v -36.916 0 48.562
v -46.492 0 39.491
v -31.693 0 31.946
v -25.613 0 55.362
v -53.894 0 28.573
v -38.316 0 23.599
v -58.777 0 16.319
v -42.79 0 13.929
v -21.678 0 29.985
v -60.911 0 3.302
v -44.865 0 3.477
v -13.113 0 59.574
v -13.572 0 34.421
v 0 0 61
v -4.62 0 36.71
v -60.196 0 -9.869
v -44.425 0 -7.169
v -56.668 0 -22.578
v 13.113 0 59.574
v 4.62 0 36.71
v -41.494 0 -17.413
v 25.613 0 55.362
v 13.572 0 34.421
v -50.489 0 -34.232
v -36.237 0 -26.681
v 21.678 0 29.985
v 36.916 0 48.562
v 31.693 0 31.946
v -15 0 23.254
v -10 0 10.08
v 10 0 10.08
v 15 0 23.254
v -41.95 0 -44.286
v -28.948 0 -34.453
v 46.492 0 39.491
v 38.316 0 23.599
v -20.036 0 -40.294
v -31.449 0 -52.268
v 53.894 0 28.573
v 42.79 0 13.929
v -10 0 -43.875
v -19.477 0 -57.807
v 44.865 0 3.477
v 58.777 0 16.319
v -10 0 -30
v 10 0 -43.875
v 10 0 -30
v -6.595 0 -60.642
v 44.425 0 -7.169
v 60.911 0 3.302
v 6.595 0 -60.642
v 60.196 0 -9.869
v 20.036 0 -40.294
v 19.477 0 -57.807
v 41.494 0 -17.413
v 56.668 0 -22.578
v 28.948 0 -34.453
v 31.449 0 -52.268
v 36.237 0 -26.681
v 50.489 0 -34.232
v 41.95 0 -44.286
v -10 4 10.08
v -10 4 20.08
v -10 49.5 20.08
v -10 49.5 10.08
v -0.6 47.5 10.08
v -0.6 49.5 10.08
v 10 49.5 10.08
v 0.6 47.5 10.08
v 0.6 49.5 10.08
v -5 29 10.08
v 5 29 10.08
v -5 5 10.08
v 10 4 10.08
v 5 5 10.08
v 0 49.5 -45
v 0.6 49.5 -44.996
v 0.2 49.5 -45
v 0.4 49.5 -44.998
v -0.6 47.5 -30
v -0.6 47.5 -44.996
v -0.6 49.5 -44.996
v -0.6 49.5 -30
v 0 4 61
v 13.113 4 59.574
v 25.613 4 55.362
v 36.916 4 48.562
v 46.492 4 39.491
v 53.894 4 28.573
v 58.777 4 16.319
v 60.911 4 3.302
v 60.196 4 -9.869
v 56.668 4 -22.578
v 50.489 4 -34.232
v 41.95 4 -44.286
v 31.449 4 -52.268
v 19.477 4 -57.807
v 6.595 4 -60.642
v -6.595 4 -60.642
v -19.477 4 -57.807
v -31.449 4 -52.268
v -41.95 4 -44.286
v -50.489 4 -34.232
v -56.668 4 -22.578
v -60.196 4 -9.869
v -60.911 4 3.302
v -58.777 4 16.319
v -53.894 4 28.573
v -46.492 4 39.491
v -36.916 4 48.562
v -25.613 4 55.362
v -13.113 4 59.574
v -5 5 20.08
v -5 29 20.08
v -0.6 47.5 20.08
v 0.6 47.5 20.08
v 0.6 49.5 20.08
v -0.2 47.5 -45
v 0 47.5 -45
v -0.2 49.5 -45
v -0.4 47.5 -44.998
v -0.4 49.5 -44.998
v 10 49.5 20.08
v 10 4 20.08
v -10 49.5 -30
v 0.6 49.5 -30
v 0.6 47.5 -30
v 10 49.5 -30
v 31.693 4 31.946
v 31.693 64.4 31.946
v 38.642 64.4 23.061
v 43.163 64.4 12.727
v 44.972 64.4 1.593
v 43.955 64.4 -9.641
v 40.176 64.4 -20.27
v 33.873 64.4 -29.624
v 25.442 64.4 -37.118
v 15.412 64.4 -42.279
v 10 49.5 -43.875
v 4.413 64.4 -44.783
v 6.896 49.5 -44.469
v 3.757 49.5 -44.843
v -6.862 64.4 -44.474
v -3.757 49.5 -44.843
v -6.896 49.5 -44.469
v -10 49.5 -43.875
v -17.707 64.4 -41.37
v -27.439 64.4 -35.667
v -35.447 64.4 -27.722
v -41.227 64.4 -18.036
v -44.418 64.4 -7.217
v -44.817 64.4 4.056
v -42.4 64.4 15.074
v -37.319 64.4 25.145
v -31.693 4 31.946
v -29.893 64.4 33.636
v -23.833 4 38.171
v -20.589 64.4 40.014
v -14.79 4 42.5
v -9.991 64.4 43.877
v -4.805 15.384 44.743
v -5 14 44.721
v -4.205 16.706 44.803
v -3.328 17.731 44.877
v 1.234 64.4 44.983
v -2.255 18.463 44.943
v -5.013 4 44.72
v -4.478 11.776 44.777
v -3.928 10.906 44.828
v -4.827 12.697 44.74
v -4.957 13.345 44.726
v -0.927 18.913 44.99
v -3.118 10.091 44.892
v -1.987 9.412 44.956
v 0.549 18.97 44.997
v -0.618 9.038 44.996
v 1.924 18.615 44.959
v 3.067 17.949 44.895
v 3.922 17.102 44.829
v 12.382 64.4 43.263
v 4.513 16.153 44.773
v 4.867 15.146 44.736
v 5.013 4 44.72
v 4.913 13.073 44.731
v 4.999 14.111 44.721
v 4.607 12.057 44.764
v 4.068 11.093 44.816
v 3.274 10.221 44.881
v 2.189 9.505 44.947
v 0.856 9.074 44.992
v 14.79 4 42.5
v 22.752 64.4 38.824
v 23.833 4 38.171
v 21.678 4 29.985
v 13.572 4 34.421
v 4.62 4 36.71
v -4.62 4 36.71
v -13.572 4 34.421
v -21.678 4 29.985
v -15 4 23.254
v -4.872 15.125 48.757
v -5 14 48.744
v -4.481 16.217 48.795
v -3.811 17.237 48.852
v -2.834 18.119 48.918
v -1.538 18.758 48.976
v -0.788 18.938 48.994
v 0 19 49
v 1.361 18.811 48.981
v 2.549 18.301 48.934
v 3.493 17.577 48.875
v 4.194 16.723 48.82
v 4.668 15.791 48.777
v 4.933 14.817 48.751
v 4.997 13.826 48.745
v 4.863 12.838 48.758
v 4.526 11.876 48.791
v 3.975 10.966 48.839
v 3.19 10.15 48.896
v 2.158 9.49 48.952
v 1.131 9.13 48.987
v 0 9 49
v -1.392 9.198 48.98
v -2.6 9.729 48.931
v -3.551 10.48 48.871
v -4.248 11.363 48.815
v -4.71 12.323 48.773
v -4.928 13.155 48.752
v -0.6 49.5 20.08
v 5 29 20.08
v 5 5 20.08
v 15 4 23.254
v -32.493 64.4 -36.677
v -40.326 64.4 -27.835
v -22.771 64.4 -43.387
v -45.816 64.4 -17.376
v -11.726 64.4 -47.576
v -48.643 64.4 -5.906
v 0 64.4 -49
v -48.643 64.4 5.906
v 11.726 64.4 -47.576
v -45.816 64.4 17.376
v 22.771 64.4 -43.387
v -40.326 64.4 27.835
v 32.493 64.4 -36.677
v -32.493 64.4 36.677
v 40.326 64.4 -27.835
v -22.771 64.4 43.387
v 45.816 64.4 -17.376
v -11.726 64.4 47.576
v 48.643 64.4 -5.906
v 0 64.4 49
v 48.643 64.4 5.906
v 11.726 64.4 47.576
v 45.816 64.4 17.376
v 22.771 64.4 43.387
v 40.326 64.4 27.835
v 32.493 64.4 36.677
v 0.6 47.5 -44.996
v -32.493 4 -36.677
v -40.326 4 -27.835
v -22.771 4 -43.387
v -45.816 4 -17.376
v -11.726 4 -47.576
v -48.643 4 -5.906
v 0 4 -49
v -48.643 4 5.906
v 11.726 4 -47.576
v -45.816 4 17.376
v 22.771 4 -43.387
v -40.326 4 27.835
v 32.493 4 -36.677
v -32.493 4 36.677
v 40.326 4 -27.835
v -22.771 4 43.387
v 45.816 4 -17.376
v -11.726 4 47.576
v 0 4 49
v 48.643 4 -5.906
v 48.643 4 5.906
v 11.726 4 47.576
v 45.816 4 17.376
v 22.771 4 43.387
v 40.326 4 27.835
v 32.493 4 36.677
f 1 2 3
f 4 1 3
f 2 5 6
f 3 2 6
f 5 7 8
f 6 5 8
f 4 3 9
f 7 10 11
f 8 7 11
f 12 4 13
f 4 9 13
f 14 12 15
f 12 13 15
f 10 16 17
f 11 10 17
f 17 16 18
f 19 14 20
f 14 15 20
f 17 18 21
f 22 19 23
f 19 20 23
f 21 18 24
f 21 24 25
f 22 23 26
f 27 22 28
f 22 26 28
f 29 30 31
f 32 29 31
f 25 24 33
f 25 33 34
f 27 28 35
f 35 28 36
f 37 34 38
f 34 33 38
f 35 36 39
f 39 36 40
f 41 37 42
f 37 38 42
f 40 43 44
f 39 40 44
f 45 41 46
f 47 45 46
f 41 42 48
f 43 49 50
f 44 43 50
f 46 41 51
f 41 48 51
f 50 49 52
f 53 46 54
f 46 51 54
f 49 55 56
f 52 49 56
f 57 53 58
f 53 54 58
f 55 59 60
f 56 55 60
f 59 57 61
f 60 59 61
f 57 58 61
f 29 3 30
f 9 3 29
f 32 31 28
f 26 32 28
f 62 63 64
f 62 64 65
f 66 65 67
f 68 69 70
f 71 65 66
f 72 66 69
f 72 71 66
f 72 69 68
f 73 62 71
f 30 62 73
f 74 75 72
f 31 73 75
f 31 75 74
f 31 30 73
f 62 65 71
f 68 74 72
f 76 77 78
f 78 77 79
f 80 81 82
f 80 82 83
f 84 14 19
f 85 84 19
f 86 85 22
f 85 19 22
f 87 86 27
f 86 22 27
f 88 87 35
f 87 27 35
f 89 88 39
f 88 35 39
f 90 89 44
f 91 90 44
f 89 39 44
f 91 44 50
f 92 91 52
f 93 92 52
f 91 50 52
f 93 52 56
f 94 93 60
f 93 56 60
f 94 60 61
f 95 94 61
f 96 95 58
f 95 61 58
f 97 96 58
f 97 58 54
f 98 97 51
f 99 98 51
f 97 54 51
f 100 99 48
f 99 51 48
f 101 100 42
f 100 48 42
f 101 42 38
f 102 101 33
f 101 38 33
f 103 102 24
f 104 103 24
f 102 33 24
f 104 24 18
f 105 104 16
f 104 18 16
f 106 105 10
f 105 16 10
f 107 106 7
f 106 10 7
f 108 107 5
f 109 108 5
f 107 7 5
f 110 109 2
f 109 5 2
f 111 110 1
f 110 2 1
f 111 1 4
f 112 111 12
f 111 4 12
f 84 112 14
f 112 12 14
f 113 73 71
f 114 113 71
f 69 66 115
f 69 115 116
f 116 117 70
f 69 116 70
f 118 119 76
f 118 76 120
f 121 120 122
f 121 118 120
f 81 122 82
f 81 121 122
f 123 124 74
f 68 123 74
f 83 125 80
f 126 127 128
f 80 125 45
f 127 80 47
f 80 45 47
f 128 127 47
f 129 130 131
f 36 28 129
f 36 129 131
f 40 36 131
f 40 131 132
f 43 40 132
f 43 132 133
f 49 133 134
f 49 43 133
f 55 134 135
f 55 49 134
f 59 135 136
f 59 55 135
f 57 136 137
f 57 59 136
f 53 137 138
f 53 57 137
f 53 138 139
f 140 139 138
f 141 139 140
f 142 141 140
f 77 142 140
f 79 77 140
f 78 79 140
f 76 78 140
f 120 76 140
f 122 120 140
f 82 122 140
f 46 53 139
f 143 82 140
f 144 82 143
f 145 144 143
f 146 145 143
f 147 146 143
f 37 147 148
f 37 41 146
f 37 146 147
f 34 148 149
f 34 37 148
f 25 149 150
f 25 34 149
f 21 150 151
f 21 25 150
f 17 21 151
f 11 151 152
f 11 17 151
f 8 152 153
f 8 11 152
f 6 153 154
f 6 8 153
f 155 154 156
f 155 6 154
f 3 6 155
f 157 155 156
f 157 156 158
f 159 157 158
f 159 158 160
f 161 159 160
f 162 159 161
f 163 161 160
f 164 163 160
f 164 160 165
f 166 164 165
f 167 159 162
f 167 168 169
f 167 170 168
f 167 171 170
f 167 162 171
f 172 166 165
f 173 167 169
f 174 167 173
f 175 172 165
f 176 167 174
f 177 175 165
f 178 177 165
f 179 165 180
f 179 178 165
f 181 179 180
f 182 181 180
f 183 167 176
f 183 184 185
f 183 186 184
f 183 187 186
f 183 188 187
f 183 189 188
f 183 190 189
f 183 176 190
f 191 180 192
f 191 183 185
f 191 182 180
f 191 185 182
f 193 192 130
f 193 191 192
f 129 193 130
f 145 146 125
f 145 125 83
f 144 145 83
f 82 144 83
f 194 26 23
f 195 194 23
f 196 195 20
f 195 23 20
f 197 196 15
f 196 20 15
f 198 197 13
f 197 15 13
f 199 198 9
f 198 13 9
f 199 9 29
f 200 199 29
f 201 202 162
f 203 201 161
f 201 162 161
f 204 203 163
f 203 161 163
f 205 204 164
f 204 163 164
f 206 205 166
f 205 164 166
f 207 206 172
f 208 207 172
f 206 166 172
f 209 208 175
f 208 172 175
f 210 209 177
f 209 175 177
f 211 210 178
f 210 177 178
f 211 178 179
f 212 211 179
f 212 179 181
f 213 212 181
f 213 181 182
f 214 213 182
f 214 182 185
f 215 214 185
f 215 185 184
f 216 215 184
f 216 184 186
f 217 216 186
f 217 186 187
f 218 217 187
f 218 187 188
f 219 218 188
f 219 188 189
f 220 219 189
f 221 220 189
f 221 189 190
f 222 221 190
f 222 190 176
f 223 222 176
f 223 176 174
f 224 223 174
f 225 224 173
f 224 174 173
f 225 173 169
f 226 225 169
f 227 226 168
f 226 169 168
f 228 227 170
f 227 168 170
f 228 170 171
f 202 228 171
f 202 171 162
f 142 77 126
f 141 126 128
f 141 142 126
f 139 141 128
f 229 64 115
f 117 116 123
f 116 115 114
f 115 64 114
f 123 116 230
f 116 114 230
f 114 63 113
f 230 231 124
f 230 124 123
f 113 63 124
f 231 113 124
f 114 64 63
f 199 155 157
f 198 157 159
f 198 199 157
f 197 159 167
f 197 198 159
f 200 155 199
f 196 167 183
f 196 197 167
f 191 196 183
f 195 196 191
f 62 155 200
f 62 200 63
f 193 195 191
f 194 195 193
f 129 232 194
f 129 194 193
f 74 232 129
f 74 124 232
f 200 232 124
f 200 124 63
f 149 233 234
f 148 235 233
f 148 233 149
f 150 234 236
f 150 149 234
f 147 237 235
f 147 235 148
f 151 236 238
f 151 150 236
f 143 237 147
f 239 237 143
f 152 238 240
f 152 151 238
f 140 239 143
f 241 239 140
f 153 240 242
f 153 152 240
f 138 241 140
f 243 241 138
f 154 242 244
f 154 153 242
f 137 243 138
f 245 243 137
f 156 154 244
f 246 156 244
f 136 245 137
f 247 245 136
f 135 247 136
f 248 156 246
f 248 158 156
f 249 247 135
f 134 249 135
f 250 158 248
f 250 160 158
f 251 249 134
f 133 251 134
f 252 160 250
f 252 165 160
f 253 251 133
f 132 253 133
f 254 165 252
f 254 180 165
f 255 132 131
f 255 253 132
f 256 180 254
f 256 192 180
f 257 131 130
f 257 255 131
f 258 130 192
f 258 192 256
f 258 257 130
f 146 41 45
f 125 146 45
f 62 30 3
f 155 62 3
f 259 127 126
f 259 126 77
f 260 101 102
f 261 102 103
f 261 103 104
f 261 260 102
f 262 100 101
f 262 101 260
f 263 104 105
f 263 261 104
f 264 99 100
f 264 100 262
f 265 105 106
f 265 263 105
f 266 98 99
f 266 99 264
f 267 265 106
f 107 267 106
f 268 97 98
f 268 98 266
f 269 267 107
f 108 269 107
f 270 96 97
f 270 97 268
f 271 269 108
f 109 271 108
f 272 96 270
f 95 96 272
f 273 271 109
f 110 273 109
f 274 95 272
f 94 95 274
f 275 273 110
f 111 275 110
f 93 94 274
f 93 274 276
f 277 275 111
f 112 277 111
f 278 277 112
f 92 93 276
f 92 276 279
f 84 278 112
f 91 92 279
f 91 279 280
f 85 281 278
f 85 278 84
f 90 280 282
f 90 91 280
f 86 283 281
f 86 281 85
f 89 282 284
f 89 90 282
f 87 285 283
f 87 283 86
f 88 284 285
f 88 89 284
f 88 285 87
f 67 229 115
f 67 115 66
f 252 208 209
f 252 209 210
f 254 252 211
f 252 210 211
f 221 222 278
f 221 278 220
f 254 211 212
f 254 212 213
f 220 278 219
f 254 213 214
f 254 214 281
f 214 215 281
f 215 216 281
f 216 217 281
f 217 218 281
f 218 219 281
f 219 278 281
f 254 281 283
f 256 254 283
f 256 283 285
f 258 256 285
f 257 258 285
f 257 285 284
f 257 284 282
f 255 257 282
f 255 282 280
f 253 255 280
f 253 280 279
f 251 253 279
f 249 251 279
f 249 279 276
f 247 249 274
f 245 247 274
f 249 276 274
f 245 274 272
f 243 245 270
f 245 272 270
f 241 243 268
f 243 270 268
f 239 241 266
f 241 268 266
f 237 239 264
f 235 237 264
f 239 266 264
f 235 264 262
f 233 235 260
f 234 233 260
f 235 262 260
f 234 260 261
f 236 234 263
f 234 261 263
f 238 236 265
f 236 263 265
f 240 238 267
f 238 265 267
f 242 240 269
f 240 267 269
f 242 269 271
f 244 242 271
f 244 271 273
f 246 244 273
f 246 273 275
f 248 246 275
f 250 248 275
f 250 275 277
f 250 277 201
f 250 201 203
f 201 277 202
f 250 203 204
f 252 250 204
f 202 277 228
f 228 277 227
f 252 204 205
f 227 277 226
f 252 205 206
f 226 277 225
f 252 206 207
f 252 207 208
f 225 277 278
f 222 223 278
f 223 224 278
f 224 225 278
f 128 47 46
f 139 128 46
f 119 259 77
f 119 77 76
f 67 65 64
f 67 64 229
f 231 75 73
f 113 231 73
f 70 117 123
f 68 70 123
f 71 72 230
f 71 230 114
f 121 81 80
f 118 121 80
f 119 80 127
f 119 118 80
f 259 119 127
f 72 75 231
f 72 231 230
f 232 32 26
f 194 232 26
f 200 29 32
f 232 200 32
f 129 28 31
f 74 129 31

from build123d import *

# Parameters (mm, degrees)
SKETCH1_R               = 61
SKETCH1_R_2             = 49
BOSS_EXTRUDE1_DEPTH     = 4
BOSS_EXTRUDE2_DEPTH     = 4
SKETCH1_5_R             = 49
SKETCH1_5_R_2           = 45
BOSS_EXTRUDE3_DEPTH     = 64.4
SKETCH1_8_W             = 20
SKETCH1_8_H             = 10
BOSS_EXTRUDE4_DEPTH     = 49.5
CUT_EXTRUDE1_REACH      = 115.669
SKETCH2_W               = 10
SKETCH2_H               = 24
CUT_EXTRUDE2_REACH      = 115.669
CUT_EXTRUDE2_END_RADIUS = 49
SKETCH3_R               = 5
CUT_EXTRUDE4_START      = -2
CUT_EXTRUDE4_DEPTH      = 2
SKETCH5_W               = 1.2
SKETCH5_H               = 10
CUT_EXTRUDE5_DEPTH      = 2


with BuildPart() as part:
    # Sketch1 → Boss-Extrude1 (new body)
    with BuildSketch(Plane(origin=(0, 0, 0), x_dir=(1, 0, 0), z_dir=(0, 1, 0))):
        with Locations(Location((0, 0, 0), (0, 0, 270))):
            Circle(SKETCH1_R)
        with Locations(Location((0, 0, 0), (0, 0, 270))):
            Circle(SKETCH1_R_2, mode=Mode.SUBTRACT)
    extrude(amount=BOSS_EXTRUDE1_DEPTH)



with BuildPart() as body_2:
    # Sketch1<4> → Boss-Extrude2 (new body)
    with BuildSketch(Plane(origin=(0, 0, 0), x_dir=(1, 0, 0), z_dir=(0, 1, 0))):
        with BuildLine():
            Line((31.692781496, -31.946323748), (10, -10.08))
            Line((10, -10.08), (10, -20.08))
            Line((10, -20.08), (-10, -20.08))
            Line((-10, -20.08), (-10, -10.08))
            Line((-10, -10.08), (-31.692781496, -31.946323748))
            ThreePointArc((-31.692781496, -31.946323748), (0, -45), (31.692781496, -31.946323748))
        make_face()
        with BuildLine():
            Line((-21.677506364, -29.984758092), (-15, -23.253831677))
            Line((-15, -23.253831677), (15, -23.253831677))
            Line((15, -23.253831677), (21.677506364, -29.984758092))
            ThreePointArc((21.677506364, -29.984758092), (0, -37), (-21.677506364, -29.984758092))
        make_face(mode=Mode.SUBTRACT)
    extrude(amount=BOSS_EXTRUDE2_DEPTH)


with BuildPart() as part_1:
    add(part.part)

    add(body_2.part)  # Boss-Extrude3 merges body 2
    # Sketch1<5> → Boss-Extrude3 (add)
    with BuildSketch(Plane(origin=(0, 0, 0), x_dir=(1, 0, 0), z_dir=(0, 1, 0))):
        with Locations(Location((0, 0, 0), (0, 0, 270))):
            Circle(SKETCH1_5_R)
        with Locations(Location((0, 0, 0), (0, 0, 314.77173117))):
            Circle(SKETCH1_5_R_2, mode=Mode.SUBTRACT)
    extrude(amount=BOSS_EXTRUDE3_DEPTH)

    # Sketch1<8> → Boss-Extrude4 (add)
    with BuildSketch(Plane(origin=(0, 0, 0), x_dir=(1, 0, 0), z_dir=(0, 1, 0))):
        with BuildLine():
            Line((-10, 30), (0, 30))
            Line((0, 30), (10, 30))
            Line((10, 30), (10, 43.874821937))
            ThreePointArc((10, 43.874821937), (0, 45), (-10, 43.874821937))
            Line((-10, 43.874821937), (-10, 30))
        make_face()
        with Locations((0, -15.08)):
            Rectangle(SKETCH1_8_W, SKETCH1_8_H)
    extrude(amount=BOSS_EXTRUDE4_DEPTH)

    # Sketch2 → Cut-Extrude1 (cut, up to next)
    with BuildSketch(Plane(origin=(0, 0, 10.08), x_dir=(-1, 0, 0), z_dir=(0, 0, -1)), mode=Mode.PRIVATE) as cut_extrude1_sk1:
        with Locations((0, 17)):
            Rectangle(SKETCH2_W, SKETCH2_H)
    cut_extrude1_tool1 = extrude(cut_extrude1_sk1.sketch, amount=-CUT_EXTRUDE1_REACH, mode=Mode.PRIVATE) & part_1.part
    add(cut_extrude1_tool1.solids().sort_by_distance((0, 17, 10.08))[0], mode=Mode.SUBTRACT)

    # Cut-Extrude2: up to this cylinder (the profile starts inside it)
    cut_extrude2_end = Plane(origin=(0, 14, 0), z_dir=(0, -1, 0)) * Cylinder(CUT_EXTRUDE2_END_RADIUS, 330.338, mode=Mode.PRIVATE)
    # Sketch3 → Cut-Extrude2 (cut, up to the surface)
    with BuildSketch(Plane(origin=(0, 0, 10.08), x_dir=(-1, 0, 0), z_dir=(0, 0, -1)), mode=Mode.PRIVATE) as cut_extrude2_sk1:
        with Locations((0, 14)):
            Circle(SKETCH3_R)
    cut_extrude2_tool1 = extrude(cut_extrude2_sk1.sketch, amount=-CUT_EXTRUDE2_REACH, mode=Mode.PRIVATE) & cut_extrude2_end
    add(cut_extrude2_tool1.solids().sort_by_distance((0, 14, 10.08))[0], mode=Mode.SUBTRACT)

    # Sketch4 → Cut-Extrude4 (cut)
    with BuildSketch(Plane(origin=(0, 49.5, 0), x_dir=(1, 0, 0), z_dir=(0, 1, 0)).offset(CUT_EXTRUDE4_START)):
        with BuildLine():
            Line((-0.6, 44.995999822), (-0.6, 30))
            Line((-0.6, 30), (0.6, 30))
            Line((0.6, 30), (0.6, 44.995999822))
            Line((0.6, 44.995999822), (0, 45))
            ThreePointArc((0, 45), (-0.300006667, 44.998999944), (-0.6, 44.995999822))
        make_face()
    extrude(amount=CUT_EXTRUDE4_DEPTH, mode=Mode.SUBTRACT)

    # Sketch5 → Cut-Extrude5 (cut)
    with BuildSketch(Plane(origin=(0, 49.5, 0), x_dir=(1, 0, 0), z_dir=(0, 1, 0))):
        with Locations((0, -15.08)):
            Rectangle(SKETCH5_W, SKETCH5_H)
    extrude(amount=-CUT_EXTRUDE5_DEPTH, mode=Mode.SUBTRACT)


solid = part_1.part
